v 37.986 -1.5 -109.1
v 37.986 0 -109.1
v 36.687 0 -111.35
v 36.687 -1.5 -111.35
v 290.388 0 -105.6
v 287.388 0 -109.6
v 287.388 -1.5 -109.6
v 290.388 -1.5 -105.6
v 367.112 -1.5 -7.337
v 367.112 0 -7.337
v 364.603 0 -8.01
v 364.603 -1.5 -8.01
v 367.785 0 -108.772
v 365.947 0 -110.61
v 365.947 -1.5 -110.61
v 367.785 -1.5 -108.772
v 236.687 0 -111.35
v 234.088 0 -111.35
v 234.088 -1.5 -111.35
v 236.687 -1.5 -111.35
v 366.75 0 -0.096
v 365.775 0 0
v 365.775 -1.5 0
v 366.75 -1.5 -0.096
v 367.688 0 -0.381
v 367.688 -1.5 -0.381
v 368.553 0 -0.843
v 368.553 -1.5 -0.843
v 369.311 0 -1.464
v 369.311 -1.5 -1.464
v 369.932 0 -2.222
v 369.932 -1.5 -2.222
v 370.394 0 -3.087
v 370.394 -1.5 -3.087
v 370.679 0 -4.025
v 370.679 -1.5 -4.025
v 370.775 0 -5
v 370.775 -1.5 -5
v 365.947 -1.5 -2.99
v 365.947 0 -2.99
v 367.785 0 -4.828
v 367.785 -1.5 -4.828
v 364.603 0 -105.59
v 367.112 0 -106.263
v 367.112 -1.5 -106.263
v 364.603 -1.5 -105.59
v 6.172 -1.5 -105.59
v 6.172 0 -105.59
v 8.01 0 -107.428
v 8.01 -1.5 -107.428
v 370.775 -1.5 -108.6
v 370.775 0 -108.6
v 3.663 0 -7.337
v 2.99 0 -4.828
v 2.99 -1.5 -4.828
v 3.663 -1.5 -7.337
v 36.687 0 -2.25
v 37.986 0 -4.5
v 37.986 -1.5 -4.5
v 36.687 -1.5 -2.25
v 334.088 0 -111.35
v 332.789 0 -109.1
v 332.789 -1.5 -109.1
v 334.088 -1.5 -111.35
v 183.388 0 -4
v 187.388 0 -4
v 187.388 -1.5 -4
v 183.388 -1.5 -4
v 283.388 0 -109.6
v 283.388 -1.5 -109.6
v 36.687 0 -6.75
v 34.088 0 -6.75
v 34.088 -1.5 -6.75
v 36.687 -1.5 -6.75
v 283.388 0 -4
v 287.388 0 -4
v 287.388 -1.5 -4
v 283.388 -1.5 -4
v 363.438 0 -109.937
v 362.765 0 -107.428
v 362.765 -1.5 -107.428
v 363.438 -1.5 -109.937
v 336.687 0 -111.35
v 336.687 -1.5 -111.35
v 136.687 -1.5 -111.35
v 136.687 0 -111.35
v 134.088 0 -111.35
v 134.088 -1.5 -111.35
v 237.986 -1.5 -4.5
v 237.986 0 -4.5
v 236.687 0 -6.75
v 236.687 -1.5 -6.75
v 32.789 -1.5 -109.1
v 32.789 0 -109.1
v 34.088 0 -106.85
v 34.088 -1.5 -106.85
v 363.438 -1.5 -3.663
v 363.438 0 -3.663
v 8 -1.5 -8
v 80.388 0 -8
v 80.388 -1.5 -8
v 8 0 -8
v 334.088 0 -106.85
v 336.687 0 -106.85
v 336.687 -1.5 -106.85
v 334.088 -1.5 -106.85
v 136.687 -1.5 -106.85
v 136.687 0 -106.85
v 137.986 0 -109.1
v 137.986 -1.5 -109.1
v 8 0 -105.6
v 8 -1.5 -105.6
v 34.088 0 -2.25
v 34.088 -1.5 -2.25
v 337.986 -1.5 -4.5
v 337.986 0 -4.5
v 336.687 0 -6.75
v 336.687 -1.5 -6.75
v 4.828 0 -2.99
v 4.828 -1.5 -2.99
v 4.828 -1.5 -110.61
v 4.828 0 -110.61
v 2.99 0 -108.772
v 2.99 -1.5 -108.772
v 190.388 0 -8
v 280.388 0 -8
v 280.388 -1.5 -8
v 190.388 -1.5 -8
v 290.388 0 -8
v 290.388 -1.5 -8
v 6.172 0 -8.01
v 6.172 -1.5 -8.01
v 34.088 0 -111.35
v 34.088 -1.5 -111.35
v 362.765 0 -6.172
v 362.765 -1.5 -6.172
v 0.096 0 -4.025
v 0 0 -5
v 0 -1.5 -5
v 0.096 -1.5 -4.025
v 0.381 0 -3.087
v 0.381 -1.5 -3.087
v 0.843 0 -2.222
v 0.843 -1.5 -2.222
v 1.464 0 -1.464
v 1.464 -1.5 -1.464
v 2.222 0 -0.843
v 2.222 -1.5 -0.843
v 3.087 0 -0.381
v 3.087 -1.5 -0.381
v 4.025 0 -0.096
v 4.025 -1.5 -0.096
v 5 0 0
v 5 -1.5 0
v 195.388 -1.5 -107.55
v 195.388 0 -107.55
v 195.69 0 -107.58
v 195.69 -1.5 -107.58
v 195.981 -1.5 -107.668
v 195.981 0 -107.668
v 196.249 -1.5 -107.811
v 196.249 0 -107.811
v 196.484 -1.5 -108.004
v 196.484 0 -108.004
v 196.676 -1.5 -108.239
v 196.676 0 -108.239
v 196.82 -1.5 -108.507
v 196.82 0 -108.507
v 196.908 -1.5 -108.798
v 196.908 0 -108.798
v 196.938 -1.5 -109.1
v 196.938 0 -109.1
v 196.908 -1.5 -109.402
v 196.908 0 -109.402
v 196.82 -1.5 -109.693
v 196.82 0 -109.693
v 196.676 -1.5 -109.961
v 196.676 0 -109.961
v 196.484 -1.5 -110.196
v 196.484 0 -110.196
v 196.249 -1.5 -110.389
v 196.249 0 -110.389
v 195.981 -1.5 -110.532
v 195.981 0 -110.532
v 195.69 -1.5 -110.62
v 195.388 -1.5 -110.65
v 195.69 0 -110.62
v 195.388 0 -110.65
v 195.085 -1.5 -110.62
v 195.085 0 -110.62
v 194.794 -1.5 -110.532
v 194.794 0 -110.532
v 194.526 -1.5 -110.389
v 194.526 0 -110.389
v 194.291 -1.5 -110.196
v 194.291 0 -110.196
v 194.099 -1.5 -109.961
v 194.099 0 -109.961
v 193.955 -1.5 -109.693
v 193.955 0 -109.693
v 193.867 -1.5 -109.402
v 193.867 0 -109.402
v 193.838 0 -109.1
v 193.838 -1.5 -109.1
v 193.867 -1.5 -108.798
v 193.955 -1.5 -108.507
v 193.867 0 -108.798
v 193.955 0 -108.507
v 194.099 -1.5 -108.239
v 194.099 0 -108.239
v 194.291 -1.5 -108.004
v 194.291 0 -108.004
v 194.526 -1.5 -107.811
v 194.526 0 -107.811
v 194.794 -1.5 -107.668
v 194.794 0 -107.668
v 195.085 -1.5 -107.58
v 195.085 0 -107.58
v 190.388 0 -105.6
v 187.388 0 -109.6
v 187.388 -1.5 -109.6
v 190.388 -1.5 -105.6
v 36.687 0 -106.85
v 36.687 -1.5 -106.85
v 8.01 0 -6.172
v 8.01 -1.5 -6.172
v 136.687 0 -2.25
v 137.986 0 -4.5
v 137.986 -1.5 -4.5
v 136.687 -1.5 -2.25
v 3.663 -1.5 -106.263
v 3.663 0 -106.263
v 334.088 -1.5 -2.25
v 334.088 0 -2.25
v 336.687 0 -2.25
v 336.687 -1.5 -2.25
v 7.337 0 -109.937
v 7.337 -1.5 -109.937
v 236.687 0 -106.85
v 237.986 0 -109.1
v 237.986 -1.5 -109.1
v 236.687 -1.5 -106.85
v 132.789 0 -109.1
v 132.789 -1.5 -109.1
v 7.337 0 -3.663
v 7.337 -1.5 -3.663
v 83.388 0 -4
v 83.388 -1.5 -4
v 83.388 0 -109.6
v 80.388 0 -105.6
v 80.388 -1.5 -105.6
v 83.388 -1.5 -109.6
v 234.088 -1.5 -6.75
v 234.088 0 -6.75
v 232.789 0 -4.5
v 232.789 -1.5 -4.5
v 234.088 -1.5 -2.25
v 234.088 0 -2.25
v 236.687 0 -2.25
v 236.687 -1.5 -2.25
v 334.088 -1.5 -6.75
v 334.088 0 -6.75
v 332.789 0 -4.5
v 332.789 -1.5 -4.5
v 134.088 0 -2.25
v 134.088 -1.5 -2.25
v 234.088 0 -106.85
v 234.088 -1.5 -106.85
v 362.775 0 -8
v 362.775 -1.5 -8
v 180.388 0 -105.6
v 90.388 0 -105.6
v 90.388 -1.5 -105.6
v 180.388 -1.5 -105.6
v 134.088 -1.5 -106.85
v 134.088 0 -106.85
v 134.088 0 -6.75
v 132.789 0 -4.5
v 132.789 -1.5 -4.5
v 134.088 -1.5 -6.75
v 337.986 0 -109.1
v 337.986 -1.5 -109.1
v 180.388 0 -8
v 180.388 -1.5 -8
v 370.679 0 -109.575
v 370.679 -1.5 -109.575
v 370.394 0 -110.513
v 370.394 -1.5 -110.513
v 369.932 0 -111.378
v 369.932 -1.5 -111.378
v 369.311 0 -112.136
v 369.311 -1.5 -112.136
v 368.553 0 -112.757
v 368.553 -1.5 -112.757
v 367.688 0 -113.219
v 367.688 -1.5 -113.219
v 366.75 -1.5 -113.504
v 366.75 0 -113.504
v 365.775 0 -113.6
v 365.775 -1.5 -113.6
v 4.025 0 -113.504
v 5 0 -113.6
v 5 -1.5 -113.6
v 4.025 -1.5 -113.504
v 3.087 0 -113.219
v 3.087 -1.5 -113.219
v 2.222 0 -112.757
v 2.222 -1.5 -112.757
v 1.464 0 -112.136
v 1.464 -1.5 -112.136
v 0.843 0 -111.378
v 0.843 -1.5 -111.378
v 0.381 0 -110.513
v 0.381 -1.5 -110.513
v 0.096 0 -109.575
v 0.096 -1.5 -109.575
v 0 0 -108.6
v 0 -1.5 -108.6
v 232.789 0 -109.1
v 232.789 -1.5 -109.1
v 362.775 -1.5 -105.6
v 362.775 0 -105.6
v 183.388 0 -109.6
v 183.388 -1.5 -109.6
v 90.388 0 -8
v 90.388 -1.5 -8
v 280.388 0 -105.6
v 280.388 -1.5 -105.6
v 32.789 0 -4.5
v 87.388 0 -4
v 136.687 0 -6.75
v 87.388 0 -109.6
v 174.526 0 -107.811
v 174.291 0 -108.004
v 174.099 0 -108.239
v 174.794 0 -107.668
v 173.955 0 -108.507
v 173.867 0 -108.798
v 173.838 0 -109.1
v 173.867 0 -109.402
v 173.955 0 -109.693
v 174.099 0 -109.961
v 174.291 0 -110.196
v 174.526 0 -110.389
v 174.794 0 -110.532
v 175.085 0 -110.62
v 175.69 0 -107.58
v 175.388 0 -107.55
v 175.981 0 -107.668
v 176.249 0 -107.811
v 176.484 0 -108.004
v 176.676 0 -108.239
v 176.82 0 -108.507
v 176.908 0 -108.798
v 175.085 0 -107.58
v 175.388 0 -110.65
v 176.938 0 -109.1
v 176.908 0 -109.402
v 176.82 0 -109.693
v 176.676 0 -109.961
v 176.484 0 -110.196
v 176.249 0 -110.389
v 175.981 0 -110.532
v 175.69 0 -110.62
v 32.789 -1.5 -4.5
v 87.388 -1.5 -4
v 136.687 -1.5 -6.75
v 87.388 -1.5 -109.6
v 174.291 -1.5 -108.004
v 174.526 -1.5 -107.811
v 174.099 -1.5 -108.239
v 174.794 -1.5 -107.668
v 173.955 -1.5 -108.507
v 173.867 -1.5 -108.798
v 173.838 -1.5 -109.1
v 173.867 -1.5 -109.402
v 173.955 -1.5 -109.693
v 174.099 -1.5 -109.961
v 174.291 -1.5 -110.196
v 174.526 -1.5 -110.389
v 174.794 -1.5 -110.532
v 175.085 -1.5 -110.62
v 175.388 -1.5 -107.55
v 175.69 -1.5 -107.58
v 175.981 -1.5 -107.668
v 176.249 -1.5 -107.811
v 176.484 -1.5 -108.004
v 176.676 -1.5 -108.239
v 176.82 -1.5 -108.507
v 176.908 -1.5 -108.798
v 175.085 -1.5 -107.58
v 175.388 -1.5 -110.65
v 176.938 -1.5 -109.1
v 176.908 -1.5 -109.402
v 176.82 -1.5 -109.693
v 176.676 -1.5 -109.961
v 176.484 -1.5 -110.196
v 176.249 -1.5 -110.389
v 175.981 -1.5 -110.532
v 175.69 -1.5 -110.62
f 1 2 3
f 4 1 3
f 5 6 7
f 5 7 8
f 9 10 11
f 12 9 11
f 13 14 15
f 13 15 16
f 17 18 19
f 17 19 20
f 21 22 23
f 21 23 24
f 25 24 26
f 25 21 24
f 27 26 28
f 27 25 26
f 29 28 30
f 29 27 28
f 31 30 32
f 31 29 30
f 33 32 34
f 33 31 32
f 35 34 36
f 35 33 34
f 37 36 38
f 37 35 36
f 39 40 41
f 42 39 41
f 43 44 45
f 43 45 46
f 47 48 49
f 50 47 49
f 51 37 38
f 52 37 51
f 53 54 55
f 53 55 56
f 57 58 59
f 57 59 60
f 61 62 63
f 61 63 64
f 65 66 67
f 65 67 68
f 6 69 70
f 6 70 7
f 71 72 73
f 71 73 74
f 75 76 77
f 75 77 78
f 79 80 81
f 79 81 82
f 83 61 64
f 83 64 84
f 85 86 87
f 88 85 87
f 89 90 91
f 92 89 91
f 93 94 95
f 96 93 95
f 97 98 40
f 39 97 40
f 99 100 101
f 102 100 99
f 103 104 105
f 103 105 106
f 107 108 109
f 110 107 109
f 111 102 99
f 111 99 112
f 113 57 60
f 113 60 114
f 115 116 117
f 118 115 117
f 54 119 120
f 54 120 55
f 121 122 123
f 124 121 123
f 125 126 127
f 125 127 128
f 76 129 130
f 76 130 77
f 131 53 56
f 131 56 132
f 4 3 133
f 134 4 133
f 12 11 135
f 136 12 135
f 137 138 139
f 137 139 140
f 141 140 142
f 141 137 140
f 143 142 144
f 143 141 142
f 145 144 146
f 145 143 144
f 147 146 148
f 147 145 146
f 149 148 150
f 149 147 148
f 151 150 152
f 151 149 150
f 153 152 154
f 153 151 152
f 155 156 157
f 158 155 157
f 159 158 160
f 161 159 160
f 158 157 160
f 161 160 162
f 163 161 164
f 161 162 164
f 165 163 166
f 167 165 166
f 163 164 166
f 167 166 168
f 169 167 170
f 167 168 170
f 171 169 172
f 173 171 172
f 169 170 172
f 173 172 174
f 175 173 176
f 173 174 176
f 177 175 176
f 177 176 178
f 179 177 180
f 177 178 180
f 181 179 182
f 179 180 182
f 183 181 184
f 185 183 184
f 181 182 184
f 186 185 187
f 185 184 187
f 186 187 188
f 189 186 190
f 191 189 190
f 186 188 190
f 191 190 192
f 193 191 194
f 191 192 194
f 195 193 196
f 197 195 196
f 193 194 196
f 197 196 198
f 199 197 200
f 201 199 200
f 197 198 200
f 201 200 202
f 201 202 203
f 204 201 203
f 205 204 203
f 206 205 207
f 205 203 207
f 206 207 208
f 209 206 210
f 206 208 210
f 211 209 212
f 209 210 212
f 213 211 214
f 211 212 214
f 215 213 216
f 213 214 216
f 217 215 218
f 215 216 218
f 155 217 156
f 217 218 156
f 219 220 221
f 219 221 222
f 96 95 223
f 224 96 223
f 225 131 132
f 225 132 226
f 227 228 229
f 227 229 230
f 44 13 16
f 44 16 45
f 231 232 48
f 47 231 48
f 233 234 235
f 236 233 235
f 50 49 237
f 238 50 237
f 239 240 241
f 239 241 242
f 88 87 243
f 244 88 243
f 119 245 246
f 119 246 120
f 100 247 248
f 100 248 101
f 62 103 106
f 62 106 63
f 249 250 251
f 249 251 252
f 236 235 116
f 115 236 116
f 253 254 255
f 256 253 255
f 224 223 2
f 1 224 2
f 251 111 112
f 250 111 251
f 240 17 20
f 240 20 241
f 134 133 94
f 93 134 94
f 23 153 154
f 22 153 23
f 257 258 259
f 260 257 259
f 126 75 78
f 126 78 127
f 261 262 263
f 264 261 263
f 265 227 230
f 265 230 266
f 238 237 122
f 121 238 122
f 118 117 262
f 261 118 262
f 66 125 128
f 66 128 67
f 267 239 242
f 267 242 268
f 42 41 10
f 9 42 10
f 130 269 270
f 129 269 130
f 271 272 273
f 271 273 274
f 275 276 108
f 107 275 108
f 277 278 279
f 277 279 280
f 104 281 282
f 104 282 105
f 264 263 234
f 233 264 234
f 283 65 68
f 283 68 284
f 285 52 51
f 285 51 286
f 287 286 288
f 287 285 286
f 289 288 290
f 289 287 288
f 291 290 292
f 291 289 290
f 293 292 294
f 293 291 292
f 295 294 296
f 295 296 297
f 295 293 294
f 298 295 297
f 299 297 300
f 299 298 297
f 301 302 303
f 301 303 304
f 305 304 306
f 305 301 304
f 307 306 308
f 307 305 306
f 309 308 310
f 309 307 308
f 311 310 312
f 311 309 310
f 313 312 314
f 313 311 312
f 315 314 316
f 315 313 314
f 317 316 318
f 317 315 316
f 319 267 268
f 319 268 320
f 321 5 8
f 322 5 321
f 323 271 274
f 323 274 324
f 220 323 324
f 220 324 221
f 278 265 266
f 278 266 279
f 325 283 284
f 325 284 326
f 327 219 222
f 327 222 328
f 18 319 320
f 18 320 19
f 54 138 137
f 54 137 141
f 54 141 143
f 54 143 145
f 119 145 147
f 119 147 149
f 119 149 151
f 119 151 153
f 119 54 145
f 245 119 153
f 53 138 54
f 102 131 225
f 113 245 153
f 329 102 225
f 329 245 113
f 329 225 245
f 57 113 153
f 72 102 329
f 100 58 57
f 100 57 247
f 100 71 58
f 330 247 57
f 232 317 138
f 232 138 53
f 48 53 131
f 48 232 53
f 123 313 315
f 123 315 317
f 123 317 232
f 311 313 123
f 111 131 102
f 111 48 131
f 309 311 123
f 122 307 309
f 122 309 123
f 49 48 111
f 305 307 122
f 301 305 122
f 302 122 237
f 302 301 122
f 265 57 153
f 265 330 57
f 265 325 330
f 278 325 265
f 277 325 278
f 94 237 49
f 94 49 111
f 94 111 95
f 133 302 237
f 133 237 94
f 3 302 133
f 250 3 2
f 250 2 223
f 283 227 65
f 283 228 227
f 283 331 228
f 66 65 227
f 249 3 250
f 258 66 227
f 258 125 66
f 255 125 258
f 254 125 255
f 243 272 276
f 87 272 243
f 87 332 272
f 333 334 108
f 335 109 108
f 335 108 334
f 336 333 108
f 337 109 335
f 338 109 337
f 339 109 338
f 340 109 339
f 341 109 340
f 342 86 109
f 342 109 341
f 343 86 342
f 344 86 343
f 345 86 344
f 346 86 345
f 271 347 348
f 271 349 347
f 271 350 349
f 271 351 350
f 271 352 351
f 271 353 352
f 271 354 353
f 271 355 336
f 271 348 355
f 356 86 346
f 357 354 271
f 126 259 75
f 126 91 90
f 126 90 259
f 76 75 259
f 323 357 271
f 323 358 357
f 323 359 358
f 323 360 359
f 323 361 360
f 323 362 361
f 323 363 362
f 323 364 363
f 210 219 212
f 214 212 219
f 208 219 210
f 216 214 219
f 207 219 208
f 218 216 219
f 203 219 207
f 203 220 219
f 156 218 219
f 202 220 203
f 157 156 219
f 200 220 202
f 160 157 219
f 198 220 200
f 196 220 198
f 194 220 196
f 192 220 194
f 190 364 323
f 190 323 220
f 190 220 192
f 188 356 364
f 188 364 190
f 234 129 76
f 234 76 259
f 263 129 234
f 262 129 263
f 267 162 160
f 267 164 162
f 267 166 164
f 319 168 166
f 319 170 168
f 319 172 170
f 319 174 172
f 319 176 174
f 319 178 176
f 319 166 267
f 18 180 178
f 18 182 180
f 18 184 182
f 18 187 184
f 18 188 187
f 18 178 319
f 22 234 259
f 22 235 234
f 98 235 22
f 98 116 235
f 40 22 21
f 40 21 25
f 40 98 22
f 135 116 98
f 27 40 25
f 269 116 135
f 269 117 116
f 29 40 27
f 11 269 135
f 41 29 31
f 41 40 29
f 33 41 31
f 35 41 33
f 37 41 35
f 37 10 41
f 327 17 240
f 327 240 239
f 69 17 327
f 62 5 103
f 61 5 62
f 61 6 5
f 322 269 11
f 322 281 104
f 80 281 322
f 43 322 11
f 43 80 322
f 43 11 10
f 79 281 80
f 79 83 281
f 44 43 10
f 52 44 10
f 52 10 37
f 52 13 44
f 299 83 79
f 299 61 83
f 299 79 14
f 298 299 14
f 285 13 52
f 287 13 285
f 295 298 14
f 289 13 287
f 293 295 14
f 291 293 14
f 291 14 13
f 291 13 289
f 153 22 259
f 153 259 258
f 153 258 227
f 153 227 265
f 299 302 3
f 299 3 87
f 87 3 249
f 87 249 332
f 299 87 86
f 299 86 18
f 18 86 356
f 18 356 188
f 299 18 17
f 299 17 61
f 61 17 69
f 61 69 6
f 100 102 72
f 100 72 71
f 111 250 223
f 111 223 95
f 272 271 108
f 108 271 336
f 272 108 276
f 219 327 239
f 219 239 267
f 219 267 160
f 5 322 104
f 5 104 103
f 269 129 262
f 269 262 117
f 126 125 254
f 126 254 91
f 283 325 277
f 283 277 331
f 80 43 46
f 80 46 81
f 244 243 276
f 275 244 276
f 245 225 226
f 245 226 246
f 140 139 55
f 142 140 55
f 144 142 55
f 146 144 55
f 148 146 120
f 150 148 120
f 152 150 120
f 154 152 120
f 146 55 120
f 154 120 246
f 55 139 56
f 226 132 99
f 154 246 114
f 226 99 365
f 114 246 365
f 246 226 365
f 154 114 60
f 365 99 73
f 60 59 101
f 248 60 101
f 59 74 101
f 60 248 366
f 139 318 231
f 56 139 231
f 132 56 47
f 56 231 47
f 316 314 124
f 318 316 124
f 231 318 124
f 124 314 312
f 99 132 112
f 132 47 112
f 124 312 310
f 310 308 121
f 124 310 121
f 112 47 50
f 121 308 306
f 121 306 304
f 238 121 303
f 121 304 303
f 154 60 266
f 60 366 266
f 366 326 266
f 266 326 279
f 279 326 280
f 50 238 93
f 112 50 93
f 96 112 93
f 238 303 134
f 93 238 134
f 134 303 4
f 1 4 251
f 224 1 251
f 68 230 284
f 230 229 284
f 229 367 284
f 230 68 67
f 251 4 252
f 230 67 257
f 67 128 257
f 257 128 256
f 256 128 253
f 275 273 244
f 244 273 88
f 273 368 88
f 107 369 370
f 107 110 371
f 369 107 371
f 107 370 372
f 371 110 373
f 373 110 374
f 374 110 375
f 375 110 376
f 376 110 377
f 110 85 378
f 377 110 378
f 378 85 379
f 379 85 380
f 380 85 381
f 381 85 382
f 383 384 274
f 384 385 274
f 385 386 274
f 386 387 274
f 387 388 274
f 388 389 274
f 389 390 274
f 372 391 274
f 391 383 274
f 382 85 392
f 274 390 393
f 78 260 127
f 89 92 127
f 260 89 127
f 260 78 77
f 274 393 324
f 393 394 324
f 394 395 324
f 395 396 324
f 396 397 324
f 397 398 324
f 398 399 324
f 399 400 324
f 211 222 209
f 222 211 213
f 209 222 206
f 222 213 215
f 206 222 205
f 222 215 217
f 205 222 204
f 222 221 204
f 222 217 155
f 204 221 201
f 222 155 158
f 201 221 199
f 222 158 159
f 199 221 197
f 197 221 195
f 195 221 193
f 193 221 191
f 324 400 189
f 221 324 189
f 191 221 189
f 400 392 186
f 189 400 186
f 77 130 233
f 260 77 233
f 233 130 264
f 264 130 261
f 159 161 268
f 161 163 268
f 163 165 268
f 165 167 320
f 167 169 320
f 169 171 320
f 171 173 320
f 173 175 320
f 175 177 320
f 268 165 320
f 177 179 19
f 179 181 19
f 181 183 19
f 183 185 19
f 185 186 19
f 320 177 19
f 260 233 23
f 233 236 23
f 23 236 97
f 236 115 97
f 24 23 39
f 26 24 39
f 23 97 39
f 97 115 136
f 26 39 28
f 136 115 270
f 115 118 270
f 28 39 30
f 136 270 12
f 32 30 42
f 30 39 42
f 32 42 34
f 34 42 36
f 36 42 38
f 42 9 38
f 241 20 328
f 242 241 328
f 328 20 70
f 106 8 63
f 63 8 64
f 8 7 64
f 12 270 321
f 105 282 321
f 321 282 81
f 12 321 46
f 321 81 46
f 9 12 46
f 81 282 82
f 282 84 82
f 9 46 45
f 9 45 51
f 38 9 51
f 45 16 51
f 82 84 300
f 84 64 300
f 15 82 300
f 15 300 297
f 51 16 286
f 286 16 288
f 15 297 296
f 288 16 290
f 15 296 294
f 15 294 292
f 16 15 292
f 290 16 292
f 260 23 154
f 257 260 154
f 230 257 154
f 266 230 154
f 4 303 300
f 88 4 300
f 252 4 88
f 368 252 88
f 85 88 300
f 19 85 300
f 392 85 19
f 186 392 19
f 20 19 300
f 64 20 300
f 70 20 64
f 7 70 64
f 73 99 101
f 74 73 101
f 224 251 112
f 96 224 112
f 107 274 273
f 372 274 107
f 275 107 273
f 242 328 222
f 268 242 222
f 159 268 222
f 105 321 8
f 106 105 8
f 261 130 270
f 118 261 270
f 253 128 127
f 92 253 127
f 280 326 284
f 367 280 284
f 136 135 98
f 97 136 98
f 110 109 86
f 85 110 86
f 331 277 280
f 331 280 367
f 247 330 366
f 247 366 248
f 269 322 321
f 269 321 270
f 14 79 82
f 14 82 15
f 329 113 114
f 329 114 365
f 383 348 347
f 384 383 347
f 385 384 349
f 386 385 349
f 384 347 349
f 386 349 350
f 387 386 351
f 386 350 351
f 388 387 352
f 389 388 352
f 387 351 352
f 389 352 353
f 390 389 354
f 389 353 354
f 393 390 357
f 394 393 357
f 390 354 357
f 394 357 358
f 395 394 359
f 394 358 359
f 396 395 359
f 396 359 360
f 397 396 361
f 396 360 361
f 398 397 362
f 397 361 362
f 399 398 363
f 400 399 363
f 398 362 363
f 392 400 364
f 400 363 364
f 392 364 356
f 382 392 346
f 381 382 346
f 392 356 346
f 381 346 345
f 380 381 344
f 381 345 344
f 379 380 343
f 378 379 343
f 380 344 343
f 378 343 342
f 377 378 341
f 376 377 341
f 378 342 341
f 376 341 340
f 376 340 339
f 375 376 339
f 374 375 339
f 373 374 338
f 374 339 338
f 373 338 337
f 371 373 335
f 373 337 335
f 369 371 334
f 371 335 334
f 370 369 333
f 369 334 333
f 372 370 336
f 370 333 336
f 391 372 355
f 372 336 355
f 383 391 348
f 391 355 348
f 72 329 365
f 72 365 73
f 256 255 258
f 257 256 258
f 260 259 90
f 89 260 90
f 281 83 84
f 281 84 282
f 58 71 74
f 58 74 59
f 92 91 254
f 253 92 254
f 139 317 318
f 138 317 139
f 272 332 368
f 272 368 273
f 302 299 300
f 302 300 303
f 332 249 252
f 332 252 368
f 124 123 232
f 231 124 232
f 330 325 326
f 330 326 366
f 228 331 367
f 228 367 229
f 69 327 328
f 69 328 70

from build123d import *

# Parameters (mm, degrees)
SKETCH1_R           = 1.55
BOSS_EXTRUDE1_DEPTH = 1.5


with BuildPart() as part:
    # Sketch1 → Boss-Extrude1 (new body)
    with BuildSketch(Plane(origin=(0, 0, 0), x_dir=(1, 0, 0), z_dir=(0, 1, 0))):
        with BuildLine():
            Line((4.973e-06, 108.599999805), (4.973e-06, 4.999999805))
            ThreePointArc((4.973e-06, 4.999999805), (1.464471067, 1.464465899), (5.000004973, -1.95e-07))
            Line((5.000004973, -1.95e-07), (365.775004973, -1.95e-07))
            ThreePointArc((365.775004973, -1.95e-07), (369.310538879, 1.464465899), (370.775004973, 4.999999805))
            Line((370.775004973, 4.999999805), (370.775004973, 108.599999805))
            ThreePointArc((370.775004973, 108.599999805), (369.310538879, 112.135533711), (365.775004973, 113.599999805))
            Line((365.775004973, 113.599999805), (5.000004973, 113.599999805))
            ThreePointArc((5.000004973, 113.599999805), (1.464471067, 112.135533711), (4.973e-06, 108.599999805))
        make_face()
        with Locations(Location((175.387504973, 109.099999805, 0), (0, 0, 270))):
            Circle(SKETCH1_R, mode=Mode.SUBTRACT)
        with Locations(Location((195.387504973, 109.099999805, 0), (0, 0, 270))):
            Circle(SKETCH1_R, mode=Mode.SUBTRACT)
        Polygon((8.000004973, 7.999999805), (8.000004973, 105.599999805), (80.387504973, 105.599999805), (83.387504973, 109.599999805), (87.387504973, 109.599999805), (90.387504973, 105.599999805), (180.387504973, 105.599999805), (183.387504973, 109.599999805), (187.387504973, 109.599999805), (190.387504973, 105.599999805), (280.387504973, 105.599999805), (283.387504973, 109.599999805), (287.387504973, 109.599999805), (290.387504973, 105.599999805), (362.775004973, 105.599999805), (362.775004973, 7.999999805), (290.387504973, 7.999999805), (287.387504973, 3.999999805), (283.387504973, 3.999999805), (280.387504973, 7.999999805), (190.387504973, 7.999999805), (187.387504973, 3.999999805), (183.387504973, 3.999999805), (180.387504973, 7.999999805), (90.387504973, 7.999999805), (87.387504973, 3.999999805), (83.387504973, 3.999999805), (80.387504973, 7.999999805), align=None, mode=Mode.SUBTRACT)
        Polygon((234.088466868, 111.349999805), (236.686543079, 111.349999805), (237.985581185, 109.099999805), (236.686543079, 106.849999805), (234.088466868, 106.849999805), (232.789428762, 109.099999805), align=None, mode=Mode.SUBTRACT)
        Polygon((334.088466868, 111.349999805), (336.686543079, 111.349999805), (337.985581185, 109.099999805), (336.686543079, 106.849999805), (334.088466868, 106.849999805), (332.789428762, 109.099999805), align=None, mode=Mode.SUBTRACT)
        Polygon((365.947436577, 110.609548716), (367.784553885, 108.772431409), (367.11212228, 106.262882498), (364.602573369, 105.590450894), (362.765456062, 107.427568201), (363.437887666, 109.937117112), align=None, mode=Mode.SUBTRACT)
        Polygon((136.686543079, 111.349999805), (134.088466868, 111.349999805), (132.789428762, 109.099999805), (134.088466868, 106.849999805), (136.686543079, 106.849999805), (137.985581185, 109.099999805), align=None, mode=Mode.SUBTRACT)
        Polygon((36.686543079, 111.349999805), (34.088466868, 111.349999805), (32.789428762, 109.099999805), (34.088466868, 106.849999805), (36.686543079, 106.849999805), (37.985581185, 109.099999805), align=None, mode=Mode.SUBTRACT)
        Polygon((4.827573369, 110.609548716), (2.990456062, 108.772431409), (3.662887666, 106.262882498), (6.172436577, 105.590450894), (8.009553885, 107.427568201), (7.33712228, 109.937117112), align=None, mode=Mode.SUBTRACT)
        Polygon((234.088466868, 2.249999805), (236.686543079, 2.249999805), (237.985581185, 4.499999805), (236.686543079, 6.749999805), (234.088466868, 6.749999805), (232.789428762, 4.499999805), align=None, mode=Mode.SUBTRACT)
        Polygon((334.088466868, 2.249999805), (336.686543079, 2.249999805), (337.985581185, 4.499999805), (336.686543079, 6.749999805), (334.088466868, 6.749999805), (332.789428762, 4.499999805), align=None, mode=Mode.SUBTRACT)
        Polygon((365.947436577, 2.990450894), (367.784553885, 4.827568201), (367.11212228, 7.337117112), (364.602573369, 8.009548716), (362.765456062, 6.172431409), (363.437887666, 3.662882498), align=None, mode=Mode.SUBTRACT)
        Polygon((136.686543079, 2.249999805), (134.088466868, 2.249999805), (132.789428762, 4.499999805), (134.088466868, 6.749999805), (136.686543079, 6.749999805), (137.985581185, 4.499999805), align=None, mode=Mode.SUBTRACT)
        Polygon((36.686543079, 2.249999805), (34.088466868, 2.249999805), (32.789428762, 4.499999805), (34.088466868, 6.749999805), (36.686543079, 6.749999805), (37.985581185, 4.499999805), align=None, mode=Mode.SUBTRACT)
        Polygon((4.827573369, 2.990450894), (2.990456062, 4.827568201), (3.662887666, 7.337117112), (6.172436577, 8.009548716), (8.009553885, 6.172431409), (7.33712228, 3.662882498), align=None, mode=Mode.SUBTRACT)
    extrude(amount=-BOSS_EXTRUDE1_DEPTH)


solid = part.part
